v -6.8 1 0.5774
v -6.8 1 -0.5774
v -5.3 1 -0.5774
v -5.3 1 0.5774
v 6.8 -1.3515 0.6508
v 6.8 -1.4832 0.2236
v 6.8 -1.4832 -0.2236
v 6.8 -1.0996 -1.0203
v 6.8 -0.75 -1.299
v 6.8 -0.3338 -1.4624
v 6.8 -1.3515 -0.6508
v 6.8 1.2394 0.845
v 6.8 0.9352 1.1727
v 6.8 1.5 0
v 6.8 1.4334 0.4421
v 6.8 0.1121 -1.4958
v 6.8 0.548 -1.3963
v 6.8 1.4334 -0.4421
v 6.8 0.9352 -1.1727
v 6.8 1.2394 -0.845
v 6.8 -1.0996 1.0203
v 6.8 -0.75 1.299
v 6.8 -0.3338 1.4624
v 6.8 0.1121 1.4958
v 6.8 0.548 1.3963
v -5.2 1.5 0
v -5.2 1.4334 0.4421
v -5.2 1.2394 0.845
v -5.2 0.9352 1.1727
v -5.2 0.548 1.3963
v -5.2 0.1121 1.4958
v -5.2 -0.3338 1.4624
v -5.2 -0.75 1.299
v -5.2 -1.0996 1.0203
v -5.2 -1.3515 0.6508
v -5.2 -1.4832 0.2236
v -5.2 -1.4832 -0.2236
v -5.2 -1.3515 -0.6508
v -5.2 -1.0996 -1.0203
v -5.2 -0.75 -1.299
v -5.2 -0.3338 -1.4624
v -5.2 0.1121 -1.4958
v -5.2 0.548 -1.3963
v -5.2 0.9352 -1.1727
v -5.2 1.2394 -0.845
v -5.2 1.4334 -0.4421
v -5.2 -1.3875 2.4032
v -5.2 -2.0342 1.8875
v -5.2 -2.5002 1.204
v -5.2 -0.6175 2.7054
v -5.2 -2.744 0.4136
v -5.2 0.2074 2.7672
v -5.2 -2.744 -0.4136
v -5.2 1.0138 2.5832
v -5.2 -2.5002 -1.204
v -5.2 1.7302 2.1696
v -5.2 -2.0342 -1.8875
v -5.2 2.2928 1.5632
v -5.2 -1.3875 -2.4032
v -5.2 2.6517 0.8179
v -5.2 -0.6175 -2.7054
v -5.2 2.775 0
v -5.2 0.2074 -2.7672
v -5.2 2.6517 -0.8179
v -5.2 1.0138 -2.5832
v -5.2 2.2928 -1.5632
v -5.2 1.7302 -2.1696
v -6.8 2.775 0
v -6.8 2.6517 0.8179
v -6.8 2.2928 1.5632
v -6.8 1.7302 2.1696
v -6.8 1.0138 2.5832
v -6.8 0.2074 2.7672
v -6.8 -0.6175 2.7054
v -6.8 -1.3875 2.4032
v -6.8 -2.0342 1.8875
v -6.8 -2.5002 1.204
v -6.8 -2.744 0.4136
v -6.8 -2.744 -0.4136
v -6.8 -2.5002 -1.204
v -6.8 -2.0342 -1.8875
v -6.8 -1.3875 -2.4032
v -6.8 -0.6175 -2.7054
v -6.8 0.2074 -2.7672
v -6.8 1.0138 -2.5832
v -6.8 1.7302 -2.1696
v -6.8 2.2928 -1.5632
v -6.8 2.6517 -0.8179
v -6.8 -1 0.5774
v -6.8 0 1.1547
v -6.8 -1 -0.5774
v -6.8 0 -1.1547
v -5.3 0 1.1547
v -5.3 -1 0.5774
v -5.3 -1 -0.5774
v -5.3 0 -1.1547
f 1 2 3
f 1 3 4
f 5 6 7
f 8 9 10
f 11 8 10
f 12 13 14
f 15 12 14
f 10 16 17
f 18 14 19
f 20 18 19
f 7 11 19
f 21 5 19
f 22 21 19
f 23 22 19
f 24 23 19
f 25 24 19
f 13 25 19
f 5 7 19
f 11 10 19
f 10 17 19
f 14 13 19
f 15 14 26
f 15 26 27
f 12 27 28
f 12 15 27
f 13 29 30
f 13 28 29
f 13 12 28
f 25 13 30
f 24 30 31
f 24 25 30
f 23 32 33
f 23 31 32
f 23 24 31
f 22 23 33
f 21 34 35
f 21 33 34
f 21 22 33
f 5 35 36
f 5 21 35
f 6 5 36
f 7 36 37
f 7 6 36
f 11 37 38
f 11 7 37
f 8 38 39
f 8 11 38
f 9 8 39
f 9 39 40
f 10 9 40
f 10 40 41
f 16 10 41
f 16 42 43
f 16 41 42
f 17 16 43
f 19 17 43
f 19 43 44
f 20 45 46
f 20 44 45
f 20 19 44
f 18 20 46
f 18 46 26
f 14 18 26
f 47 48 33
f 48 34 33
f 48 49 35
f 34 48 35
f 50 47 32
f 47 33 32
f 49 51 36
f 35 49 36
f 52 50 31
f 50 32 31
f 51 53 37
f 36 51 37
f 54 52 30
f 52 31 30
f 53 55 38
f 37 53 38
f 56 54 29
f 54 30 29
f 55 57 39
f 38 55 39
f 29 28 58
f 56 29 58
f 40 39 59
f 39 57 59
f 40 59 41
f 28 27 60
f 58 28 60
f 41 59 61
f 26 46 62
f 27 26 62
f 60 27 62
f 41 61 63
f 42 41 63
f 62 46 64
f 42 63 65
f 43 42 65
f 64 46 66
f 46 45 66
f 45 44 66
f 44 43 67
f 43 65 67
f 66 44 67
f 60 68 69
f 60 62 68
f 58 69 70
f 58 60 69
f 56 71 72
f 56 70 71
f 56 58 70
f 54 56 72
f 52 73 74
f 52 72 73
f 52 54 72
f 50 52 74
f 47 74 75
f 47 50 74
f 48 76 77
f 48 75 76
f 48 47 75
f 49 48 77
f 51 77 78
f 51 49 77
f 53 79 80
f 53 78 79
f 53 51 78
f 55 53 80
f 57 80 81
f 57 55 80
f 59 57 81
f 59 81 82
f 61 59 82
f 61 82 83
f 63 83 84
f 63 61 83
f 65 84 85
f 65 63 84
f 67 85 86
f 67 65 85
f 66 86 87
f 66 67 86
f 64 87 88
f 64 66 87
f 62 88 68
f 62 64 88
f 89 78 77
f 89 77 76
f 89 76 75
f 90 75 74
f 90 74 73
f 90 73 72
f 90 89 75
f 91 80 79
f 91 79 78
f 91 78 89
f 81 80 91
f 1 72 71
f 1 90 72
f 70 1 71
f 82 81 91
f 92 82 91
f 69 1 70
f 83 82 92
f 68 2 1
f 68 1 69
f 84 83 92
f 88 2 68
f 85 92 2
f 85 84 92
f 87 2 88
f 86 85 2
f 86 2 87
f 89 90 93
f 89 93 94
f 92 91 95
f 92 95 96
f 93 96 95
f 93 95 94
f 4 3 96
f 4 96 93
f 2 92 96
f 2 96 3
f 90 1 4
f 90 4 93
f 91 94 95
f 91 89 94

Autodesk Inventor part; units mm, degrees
ref_plane "YZ Plane" through (0, 0, 0) normal (1, 0, 0) x (0, 1, 0)
ref_plane "XZ Plane" through (0, 0, 0) normal (0, 1, 0) x (-1, 0, 0)
ref_plane "XY Plane" through (0, 0, 0) normal (0, 0, 1) x (1, 0, 0)
sketch "Sketch1" plane through (0, 0, 0) normal (0, 0, 1) x (1, 0, 0)
  line L0 (0, 0) -> (-6.8, 0)
  line L1 (-6.8, 0) -> (-6.8, 2.775)
  line L2 (-6.8, 2.775) -> (-5.2, 2.775)
  line L3 (-5.2, 2.775) -> (-5.2, 1.5)
  line L4 (-5.2, 1.5) -> (6.8, 1.5)
  line L5 (6.8, 1.5) -> (6.8, 0)
  line L6 (6.8, 0) -> (0, 0)
  dimension "d0" = 12
  dimension "d1" = 2.775
  dimension "d2" = 1.6
  dimension "d3" = 1.5
revolve "Revolution1" add sketch "Sketch1" angle 360 about axis through (0, 0, 0) along (-1, 0, 0)
sketch "Sketch2" plane through (-6.8, 0, 0) normal (-1, 0, 0) x (0, 0, 1)
  line L0 (-1.1547, 0) -> (-0.5774, 1)
  line L1 (-0.5774, 1) -> (0.5774, 1)
  line L2 (0.5774, 1) -> (1.1547, 0)
  line L3 (1.1547, 0) -> (0.5774, -1)
  line L4 (0.5774, -1) -> (-0.5774, -1)
  line L5 (-0.5774, -1) -> (-1.1547, 0)
  point P0 (0, 0)
  point P1 (0, 0)
  dimension "d5" = 2
extrude "Extrusion1" cut sketch "Sketch2" against normal blind 1.5
properties part number "M3x12"
